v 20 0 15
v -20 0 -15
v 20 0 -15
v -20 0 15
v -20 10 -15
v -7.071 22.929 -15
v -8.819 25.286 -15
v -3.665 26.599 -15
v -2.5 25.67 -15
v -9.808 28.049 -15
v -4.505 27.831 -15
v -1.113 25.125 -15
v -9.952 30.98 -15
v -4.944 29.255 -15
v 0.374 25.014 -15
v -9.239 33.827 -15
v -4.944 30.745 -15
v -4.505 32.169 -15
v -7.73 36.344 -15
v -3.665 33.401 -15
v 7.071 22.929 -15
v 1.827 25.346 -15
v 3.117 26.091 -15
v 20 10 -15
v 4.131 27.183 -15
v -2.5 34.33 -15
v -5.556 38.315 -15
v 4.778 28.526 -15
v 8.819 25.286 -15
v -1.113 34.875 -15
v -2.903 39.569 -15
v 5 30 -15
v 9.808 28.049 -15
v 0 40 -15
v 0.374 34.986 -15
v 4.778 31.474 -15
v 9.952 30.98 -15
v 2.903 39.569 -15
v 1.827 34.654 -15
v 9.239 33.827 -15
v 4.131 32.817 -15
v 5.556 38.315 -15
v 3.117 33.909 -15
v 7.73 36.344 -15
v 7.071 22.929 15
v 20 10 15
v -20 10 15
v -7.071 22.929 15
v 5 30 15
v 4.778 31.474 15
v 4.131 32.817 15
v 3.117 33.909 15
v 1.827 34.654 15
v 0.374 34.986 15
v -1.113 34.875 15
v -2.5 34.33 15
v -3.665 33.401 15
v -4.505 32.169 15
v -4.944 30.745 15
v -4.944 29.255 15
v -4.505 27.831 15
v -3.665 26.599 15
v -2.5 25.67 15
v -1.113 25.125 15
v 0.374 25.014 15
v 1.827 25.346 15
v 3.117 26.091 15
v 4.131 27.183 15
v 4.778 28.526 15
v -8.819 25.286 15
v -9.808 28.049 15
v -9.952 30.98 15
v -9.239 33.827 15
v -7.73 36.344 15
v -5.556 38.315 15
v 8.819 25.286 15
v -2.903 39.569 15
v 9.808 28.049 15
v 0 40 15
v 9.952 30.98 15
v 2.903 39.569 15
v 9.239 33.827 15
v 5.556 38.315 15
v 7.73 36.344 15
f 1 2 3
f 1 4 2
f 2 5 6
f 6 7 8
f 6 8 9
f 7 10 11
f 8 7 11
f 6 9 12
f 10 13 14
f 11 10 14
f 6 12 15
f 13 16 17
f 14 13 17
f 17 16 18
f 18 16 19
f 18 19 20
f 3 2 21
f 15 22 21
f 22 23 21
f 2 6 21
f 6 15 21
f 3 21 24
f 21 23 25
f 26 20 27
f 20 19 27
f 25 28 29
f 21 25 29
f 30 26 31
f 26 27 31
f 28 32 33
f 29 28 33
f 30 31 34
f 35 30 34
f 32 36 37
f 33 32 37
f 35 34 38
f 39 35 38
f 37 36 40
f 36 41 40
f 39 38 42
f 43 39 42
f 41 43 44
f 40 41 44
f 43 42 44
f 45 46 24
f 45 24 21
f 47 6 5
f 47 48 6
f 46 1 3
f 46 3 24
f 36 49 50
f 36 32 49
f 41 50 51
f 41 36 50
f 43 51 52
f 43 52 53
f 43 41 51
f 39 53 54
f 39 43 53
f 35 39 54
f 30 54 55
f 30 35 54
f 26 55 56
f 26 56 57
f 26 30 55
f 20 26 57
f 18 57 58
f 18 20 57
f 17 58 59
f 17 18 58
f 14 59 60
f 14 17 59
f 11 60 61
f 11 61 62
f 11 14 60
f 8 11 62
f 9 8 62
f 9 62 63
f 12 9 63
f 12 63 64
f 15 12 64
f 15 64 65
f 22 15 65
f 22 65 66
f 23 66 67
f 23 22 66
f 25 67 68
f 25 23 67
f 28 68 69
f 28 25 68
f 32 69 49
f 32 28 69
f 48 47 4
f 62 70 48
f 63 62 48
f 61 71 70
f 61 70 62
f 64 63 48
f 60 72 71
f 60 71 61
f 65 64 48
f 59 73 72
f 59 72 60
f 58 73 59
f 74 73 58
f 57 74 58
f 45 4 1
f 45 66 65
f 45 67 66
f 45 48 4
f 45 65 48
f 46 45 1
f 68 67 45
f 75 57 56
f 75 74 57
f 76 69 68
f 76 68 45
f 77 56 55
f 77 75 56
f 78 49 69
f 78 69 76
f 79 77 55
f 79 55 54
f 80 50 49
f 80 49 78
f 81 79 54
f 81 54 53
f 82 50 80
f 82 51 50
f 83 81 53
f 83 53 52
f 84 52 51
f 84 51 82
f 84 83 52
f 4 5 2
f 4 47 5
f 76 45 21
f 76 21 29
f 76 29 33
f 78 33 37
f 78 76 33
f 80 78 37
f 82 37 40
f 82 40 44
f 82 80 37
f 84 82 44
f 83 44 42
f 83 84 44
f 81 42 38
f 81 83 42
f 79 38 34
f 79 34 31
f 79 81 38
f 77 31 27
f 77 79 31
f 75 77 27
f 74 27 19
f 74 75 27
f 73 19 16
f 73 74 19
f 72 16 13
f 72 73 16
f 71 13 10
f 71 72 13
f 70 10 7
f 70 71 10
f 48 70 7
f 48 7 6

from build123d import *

# Parameters (mm, degrees)
ESBO_O1_R                = 5
RESSALTO_EXTRUS_O1_DEPTH = 15


with BuildPart() as part:
    # Esboço1 → Ressalto-extrusão1 (new body, symmetric)
    with BuildSketch(Plane.XY):
        with BuildLine():
            Line((-20, 0), (20, 0))
            Line((20, 0), (20, 10))
            Line((20, 10), (7.071067812, 22.928932188))
            ThreePointArc((7.071067812, 22.928932188), (0, 40), (-7.071067812, 22.928932188))
            Line((-7.071067812, 22.928932188), (-20, 10))
            Line((-20, 10), (-20, 0))
        make_face()
        with Locations((0, 30)):
            Circle(ESBO_O1_R, mode=Mode.SUBTRACT)
    extrude(amount=RESSALTO_EXTRUS_O1_DEPTH, both=True)


solid = part.part
